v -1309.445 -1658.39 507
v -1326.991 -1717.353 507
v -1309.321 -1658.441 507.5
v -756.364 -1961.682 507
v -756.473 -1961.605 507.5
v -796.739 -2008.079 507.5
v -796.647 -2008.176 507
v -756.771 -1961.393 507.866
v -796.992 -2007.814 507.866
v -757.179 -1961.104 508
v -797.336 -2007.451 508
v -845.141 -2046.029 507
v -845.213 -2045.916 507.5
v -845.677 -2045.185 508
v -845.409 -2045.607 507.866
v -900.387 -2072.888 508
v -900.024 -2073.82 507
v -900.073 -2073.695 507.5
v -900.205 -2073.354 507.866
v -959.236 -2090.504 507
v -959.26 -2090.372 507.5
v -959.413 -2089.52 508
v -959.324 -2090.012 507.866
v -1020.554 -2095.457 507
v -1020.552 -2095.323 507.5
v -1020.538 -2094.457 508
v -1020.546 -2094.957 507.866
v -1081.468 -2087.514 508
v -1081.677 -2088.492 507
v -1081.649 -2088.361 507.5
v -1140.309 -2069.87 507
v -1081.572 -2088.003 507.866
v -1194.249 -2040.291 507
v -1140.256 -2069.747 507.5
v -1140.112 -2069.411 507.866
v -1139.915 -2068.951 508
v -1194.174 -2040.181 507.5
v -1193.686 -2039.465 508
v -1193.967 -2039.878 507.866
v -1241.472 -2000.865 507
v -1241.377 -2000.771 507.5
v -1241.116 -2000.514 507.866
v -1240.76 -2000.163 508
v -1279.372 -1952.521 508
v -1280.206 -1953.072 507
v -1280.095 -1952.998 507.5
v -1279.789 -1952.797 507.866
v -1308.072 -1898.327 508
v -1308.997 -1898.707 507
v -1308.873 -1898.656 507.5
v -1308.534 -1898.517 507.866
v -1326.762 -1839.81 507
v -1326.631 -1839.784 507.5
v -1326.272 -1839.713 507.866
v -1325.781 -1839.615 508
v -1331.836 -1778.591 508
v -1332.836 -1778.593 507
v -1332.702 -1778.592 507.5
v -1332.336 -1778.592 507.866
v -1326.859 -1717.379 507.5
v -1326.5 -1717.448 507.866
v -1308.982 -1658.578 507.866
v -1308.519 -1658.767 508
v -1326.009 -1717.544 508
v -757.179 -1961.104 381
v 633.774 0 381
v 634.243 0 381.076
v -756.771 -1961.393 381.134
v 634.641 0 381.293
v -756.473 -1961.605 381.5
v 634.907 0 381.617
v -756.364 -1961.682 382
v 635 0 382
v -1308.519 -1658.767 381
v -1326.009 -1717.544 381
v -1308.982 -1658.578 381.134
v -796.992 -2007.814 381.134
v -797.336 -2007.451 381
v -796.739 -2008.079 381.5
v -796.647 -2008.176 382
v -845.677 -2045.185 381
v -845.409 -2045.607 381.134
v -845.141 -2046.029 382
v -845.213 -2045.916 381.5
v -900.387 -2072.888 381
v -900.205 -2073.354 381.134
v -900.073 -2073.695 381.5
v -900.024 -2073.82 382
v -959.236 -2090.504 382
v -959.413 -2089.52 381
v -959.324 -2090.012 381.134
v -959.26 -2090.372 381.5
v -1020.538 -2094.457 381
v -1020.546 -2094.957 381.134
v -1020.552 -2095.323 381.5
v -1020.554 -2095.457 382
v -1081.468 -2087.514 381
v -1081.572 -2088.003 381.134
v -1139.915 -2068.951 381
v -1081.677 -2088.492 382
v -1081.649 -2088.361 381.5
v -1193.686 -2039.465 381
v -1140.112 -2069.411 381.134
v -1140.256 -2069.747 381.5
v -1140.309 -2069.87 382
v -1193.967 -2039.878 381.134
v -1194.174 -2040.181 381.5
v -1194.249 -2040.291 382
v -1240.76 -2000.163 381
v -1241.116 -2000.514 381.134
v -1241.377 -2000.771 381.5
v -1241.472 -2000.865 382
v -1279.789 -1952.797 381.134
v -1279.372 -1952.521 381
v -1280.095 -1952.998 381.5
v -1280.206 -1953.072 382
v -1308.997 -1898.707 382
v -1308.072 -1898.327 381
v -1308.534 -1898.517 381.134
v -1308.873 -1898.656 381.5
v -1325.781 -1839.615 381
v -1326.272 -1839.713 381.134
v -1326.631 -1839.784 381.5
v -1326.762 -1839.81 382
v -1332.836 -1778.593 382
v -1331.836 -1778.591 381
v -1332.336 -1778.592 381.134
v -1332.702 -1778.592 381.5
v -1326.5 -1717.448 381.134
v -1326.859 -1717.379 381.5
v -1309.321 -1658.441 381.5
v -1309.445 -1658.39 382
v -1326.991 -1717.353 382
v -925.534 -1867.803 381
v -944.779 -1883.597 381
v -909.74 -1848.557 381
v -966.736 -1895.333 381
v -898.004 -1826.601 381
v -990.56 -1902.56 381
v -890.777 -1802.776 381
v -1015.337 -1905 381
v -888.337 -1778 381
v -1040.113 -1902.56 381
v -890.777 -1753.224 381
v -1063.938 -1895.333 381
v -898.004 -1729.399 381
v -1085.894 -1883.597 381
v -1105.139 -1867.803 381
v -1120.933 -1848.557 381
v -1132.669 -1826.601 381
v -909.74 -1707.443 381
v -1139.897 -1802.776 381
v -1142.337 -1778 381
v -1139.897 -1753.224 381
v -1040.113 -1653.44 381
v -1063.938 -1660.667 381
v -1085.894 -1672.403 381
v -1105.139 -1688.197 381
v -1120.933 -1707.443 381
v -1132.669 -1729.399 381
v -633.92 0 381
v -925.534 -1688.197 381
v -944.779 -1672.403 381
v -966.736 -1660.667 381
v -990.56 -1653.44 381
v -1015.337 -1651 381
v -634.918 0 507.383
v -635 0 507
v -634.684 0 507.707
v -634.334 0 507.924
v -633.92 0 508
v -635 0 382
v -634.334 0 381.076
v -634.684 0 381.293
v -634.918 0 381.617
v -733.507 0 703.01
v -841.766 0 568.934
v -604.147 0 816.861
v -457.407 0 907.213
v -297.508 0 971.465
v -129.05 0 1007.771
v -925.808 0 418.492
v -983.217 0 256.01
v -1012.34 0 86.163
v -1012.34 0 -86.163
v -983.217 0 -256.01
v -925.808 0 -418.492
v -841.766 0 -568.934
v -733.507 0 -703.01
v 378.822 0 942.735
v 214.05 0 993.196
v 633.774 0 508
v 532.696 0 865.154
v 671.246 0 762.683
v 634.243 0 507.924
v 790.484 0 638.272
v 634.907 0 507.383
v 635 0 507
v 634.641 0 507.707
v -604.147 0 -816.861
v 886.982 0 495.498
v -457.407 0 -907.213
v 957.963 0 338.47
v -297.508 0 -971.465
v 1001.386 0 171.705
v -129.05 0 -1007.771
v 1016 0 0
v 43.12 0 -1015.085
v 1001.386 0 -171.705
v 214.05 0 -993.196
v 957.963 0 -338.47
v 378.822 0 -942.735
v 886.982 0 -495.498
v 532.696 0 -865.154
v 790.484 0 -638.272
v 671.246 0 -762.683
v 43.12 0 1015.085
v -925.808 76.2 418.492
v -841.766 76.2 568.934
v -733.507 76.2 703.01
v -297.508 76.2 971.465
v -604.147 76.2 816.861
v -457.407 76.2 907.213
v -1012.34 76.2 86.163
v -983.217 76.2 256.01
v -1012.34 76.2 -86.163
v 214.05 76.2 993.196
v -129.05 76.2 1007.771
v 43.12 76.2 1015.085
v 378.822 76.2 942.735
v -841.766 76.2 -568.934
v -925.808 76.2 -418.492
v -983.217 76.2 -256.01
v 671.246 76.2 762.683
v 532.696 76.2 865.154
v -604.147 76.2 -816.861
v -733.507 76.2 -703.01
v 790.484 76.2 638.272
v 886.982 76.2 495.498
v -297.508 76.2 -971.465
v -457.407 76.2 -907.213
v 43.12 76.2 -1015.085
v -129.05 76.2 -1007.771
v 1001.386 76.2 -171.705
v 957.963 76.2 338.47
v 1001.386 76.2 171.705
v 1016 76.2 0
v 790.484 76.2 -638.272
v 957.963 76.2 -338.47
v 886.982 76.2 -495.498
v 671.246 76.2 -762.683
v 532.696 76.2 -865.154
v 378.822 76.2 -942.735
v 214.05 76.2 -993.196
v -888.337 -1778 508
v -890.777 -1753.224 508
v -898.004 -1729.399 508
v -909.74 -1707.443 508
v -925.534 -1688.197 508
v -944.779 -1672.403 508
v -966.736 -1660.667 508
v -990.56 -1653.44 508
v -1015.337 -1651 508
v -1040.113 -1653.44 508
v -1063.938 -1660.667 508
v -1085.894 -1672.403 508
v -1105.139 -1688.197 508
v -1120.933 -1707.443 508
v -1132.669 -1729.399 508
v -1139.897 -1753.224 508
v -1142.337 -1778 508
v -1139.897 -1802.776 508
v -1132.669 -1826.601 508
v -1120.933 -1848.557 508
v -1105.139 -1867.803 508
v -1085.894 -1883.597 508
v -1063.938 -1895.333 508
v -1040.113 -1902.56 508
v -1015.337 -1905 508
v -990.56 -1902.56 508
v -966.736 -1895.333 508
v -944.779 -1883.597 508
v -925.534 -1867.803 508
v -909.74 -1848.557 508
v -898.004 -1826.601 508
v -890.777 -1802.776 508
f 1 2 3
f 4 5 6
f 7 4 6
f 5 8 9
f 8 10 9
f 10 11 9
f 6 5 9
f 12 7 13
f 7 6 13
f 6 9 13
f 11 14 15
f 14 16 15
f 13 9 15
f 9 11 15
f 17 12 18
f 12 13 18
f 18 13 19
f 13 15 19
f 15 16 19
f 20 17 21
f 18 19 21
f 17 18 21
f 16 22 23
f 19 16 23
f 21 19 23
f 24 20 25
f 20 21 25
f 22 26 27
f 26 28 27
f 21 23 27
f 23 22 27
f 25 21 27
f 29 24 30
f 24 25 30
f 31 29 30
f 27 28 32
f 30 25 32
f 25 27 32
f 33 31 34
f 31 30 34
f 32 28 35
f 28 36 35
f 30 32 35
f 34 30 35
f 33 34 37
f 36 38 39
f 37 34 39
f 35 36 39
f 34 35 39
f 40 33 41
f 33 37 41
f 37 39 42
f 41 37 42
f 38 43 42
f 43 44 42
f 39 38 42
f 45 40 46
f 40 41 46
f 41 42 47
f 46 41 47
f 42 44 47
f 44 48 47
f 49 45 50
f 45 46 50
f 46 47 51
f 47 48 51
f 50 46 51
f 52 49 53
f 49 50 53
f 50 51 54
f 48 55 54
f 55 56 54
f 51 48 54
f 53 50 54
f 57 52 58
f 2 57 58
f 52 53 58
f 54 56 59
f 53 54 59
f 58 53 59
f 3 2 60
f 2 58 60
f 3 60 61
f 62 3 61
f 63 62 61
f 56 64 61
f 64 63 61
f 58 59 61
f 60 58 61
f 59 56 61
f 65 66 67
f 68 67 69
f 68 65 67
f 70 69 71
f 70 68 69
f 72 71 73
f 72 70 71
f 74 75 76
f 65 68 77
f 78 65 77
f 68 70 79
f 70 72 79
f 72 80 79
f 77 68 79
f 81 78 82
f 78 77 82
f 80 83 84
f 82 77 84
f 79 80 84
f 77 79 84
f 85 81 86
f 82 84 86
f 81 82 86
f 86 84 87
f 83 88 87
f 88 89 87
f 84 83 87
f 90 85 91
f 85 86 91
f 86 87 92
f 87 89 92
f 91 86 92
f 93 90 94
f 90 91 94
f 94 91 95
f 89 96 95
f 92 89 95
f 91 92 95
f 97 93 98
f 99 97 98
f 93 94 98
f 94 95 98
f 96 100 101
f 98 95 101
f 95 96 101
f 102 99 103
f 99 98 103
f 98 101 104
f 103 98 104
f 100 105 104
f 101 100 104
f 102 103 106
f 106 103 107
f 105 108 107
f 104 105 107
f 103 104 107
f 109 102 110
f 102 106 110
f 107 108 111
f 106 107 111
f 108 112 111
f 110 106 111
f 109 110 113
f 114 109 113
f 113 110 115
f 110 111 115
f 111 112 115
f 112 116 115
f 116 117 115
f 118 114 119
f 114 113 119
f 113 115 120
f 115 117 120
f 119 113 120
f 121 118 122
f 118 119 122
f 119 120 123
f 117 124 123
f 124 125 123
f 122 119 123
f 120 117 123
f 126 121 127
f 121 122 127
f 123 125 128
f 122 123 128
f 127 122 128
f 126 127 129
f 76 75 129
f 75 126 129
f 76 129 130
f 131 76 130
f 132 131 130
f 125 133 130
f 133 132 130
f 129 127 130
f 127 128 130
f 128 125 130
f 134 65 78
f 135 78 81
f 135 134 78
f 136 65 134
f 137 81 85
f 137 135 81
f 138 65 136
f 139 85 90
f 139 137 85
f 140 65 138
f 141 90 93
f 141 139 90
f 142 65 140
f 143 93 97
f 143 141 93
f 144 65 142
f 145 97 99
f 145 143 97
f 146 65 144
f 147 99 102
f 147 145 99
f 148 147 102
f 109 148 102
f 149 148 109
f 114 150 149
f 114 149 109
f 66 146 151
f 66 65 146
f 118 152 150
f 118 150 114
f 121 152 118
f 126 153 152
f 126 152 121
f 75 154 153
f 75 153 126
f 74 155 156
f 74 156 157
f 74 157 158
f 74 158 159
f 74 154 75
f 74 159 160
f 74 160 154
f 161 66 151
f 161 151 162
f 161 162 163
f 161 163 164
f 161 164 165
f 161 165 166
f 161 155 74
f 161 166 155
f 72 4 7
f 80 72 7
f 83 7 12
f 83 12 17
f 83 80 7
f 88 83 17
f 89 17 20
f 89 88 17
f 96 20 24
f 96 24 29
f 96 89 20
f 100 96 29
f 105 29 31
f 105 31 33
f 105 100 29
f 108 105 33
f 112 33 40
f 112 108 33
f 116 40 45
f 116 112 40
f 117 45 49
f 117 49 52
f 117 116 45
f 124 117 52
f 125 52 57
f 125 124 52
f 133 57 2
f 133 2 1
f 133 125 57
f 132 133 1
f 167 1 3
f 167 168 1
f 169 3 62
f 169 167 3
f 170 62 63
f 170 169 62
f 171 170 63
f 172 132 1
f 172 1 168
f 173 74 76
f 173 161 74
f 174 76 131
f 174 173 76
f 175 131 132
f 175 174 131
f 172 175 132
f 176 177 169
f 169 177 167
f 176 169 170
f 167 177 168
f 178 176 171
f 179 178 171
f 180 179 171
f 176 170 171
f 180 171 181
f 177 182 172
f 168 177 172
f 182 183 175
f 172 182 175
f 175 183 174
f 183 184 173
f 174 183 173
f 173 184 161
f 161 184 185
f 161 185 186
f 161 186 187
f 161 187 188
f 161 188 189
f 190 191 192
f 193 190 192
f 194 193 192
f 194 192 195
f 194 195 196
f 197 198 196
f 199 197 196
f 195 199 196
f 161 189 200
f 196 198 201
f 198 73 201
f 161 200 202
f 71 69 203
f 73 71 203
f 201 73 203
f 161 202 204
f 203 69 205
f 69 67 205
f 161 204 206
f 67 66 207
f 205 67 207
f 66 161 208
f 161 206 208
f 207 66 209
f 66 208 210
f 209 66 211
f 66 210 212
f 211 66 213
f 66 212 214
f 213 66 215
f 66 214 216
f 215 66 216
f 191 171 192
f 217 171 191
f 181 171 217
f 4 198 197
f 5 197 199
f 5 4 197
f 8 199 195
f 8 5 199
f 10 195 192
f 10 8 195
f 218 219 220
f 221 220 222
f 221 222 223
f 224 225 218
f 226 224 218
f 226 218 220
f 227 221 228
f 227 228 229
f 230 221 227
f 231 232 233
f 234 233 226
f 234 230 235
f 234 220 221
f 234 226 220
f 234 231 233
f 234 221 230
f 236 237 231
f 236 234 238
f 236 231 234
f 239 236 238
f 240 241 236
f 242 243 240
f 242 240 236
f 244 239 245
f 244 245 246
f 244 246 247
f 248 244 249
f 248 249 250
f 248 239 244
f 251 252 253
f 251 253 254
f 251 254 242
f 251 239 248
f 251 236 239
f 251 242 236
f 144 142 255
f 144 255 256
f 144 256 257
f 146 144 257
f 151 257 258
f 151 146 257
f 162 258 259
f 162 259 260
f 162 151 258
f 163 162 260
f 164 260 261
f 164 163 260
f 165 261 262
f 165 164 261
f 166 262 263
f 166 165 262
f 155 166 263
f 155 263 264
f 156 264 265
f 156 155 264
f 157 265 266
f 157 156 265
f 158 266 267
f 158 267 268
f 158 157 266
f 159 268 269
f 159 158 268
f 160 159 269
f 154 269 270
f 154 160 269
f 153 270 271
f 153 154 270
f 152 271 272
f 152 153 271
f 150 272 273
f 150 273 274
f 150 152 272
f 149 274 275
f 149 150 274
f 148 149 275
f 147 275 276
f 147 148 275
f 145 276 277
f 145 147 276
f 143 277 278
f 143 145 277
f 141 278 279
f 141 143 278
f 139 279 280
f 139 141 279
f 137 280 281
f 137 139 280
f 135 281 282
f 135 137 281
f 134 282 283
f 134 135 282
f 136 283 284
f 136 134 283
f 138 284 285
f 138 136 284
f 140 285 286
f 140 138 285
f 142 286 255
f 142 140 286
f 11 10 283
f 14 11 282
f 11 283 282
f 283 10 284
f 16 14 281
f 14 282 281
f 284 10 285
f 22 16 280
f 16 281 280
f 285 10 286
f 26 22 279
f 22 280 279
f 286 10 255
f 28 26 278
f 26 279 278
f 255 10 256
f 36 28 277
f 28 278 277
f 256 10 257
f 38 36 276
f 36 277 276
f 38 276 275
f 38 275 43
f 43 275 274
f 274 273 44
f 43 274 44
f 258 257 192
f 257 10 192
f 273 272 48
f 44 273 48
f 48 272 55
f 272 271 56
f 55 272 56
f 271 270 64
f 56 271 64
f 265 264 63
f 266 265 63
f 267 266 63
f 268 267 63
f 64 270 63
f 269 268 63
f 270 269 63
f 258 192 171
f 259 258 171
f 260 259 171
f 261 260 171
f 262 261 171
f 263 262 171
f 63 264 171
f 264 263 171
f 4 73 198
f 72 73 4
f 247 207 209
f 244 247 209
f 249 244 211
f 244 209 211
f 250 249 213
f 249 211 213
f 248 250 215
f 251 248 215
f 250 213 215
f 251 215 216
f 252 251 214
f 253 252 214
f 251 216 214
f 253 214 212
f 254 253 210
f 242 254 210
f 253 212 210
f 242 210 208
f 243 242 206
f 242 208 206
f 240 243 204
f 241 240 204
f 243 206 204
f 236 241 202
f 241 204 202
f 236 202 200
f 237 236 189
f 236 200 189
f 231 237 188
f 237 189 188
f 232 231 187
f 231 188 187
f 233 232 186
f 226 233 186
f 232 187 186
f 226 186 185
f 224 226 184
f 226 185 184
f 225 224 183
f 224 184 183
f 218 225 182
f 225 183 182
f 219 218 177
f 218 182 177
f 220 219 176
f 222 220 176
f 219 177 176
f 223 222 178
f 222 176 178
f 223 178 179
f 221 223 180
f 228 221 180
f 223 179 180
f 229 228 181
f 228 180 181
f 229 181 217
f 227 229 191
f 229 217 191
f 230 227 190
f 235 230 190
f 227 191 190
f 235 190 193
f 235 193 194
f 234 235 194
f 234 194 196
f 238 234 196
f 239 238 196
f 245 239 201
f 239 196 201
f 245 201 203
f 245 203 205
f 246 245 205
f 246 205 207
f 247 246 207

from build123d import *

# Parameters (mm, degrees)
SKETCH1_R           = 1016
BOSS_EXTRUDE1_DEPTH = 76.2
SKETCH2_R           = 127
BOSS_EXTRUDE3_DEPTH = 127
FILLET1_R           = 1


with BuildPart() as part:
    # Sketch1 → Boss-Extrude1 (new body)
    with BuildSketch(Plane(origin=(0, 0, 0), x_dir=(1, 0, 0), z_dir=(0, 1, 0))):
        Circle(SKETCH1_R)
    extrude(amount=BOSS_EXTRUDE1_DEPTH)

    # Sketch2 → Boss-Extrude3 (add)
    with BuildSketch(Plane.XY.offset(381)):
        with BuildLine():
            Line((0, 0), (635, 0))
            Line((635, 0), (-756.363558902, -1961.682110671))
            ThreePointArc((-756.363558902, -1961.682110671), (-1167.996982196, -2056.390219688), (-1309.445120969, -1658.390062497))
            Line((-1309.445120969, -1658.390062497), (-635, 0))
            Line((-635, 0), (0, 0))
        make_face()
        with Locations((-1015.336785741, -1778)):
            Circle(SKETCH2_R, mode=Mode.SUBTRACT)
    extrude(amount=BOSS_EXTRUDE3_DEPTH)

    # Fillet1
    fillet1_edges = [part.edges().sort_by_distance(p)[0] for p in [
        (-972.222560484, -829.195031249, 508),
        (-1167.996982196, -2056.390219688, 508),
        (-60.681779451, -980.841055336, 508),
        (-972.222560484, -829.195031249, 381),
        (-1167.996982196, -2056.390219688, 381),
        (-60.681779451, -980.841055336, 381),
    ]]
    fillet(fillet1_edges, radius=FILLET1_R)


solid = part.part
